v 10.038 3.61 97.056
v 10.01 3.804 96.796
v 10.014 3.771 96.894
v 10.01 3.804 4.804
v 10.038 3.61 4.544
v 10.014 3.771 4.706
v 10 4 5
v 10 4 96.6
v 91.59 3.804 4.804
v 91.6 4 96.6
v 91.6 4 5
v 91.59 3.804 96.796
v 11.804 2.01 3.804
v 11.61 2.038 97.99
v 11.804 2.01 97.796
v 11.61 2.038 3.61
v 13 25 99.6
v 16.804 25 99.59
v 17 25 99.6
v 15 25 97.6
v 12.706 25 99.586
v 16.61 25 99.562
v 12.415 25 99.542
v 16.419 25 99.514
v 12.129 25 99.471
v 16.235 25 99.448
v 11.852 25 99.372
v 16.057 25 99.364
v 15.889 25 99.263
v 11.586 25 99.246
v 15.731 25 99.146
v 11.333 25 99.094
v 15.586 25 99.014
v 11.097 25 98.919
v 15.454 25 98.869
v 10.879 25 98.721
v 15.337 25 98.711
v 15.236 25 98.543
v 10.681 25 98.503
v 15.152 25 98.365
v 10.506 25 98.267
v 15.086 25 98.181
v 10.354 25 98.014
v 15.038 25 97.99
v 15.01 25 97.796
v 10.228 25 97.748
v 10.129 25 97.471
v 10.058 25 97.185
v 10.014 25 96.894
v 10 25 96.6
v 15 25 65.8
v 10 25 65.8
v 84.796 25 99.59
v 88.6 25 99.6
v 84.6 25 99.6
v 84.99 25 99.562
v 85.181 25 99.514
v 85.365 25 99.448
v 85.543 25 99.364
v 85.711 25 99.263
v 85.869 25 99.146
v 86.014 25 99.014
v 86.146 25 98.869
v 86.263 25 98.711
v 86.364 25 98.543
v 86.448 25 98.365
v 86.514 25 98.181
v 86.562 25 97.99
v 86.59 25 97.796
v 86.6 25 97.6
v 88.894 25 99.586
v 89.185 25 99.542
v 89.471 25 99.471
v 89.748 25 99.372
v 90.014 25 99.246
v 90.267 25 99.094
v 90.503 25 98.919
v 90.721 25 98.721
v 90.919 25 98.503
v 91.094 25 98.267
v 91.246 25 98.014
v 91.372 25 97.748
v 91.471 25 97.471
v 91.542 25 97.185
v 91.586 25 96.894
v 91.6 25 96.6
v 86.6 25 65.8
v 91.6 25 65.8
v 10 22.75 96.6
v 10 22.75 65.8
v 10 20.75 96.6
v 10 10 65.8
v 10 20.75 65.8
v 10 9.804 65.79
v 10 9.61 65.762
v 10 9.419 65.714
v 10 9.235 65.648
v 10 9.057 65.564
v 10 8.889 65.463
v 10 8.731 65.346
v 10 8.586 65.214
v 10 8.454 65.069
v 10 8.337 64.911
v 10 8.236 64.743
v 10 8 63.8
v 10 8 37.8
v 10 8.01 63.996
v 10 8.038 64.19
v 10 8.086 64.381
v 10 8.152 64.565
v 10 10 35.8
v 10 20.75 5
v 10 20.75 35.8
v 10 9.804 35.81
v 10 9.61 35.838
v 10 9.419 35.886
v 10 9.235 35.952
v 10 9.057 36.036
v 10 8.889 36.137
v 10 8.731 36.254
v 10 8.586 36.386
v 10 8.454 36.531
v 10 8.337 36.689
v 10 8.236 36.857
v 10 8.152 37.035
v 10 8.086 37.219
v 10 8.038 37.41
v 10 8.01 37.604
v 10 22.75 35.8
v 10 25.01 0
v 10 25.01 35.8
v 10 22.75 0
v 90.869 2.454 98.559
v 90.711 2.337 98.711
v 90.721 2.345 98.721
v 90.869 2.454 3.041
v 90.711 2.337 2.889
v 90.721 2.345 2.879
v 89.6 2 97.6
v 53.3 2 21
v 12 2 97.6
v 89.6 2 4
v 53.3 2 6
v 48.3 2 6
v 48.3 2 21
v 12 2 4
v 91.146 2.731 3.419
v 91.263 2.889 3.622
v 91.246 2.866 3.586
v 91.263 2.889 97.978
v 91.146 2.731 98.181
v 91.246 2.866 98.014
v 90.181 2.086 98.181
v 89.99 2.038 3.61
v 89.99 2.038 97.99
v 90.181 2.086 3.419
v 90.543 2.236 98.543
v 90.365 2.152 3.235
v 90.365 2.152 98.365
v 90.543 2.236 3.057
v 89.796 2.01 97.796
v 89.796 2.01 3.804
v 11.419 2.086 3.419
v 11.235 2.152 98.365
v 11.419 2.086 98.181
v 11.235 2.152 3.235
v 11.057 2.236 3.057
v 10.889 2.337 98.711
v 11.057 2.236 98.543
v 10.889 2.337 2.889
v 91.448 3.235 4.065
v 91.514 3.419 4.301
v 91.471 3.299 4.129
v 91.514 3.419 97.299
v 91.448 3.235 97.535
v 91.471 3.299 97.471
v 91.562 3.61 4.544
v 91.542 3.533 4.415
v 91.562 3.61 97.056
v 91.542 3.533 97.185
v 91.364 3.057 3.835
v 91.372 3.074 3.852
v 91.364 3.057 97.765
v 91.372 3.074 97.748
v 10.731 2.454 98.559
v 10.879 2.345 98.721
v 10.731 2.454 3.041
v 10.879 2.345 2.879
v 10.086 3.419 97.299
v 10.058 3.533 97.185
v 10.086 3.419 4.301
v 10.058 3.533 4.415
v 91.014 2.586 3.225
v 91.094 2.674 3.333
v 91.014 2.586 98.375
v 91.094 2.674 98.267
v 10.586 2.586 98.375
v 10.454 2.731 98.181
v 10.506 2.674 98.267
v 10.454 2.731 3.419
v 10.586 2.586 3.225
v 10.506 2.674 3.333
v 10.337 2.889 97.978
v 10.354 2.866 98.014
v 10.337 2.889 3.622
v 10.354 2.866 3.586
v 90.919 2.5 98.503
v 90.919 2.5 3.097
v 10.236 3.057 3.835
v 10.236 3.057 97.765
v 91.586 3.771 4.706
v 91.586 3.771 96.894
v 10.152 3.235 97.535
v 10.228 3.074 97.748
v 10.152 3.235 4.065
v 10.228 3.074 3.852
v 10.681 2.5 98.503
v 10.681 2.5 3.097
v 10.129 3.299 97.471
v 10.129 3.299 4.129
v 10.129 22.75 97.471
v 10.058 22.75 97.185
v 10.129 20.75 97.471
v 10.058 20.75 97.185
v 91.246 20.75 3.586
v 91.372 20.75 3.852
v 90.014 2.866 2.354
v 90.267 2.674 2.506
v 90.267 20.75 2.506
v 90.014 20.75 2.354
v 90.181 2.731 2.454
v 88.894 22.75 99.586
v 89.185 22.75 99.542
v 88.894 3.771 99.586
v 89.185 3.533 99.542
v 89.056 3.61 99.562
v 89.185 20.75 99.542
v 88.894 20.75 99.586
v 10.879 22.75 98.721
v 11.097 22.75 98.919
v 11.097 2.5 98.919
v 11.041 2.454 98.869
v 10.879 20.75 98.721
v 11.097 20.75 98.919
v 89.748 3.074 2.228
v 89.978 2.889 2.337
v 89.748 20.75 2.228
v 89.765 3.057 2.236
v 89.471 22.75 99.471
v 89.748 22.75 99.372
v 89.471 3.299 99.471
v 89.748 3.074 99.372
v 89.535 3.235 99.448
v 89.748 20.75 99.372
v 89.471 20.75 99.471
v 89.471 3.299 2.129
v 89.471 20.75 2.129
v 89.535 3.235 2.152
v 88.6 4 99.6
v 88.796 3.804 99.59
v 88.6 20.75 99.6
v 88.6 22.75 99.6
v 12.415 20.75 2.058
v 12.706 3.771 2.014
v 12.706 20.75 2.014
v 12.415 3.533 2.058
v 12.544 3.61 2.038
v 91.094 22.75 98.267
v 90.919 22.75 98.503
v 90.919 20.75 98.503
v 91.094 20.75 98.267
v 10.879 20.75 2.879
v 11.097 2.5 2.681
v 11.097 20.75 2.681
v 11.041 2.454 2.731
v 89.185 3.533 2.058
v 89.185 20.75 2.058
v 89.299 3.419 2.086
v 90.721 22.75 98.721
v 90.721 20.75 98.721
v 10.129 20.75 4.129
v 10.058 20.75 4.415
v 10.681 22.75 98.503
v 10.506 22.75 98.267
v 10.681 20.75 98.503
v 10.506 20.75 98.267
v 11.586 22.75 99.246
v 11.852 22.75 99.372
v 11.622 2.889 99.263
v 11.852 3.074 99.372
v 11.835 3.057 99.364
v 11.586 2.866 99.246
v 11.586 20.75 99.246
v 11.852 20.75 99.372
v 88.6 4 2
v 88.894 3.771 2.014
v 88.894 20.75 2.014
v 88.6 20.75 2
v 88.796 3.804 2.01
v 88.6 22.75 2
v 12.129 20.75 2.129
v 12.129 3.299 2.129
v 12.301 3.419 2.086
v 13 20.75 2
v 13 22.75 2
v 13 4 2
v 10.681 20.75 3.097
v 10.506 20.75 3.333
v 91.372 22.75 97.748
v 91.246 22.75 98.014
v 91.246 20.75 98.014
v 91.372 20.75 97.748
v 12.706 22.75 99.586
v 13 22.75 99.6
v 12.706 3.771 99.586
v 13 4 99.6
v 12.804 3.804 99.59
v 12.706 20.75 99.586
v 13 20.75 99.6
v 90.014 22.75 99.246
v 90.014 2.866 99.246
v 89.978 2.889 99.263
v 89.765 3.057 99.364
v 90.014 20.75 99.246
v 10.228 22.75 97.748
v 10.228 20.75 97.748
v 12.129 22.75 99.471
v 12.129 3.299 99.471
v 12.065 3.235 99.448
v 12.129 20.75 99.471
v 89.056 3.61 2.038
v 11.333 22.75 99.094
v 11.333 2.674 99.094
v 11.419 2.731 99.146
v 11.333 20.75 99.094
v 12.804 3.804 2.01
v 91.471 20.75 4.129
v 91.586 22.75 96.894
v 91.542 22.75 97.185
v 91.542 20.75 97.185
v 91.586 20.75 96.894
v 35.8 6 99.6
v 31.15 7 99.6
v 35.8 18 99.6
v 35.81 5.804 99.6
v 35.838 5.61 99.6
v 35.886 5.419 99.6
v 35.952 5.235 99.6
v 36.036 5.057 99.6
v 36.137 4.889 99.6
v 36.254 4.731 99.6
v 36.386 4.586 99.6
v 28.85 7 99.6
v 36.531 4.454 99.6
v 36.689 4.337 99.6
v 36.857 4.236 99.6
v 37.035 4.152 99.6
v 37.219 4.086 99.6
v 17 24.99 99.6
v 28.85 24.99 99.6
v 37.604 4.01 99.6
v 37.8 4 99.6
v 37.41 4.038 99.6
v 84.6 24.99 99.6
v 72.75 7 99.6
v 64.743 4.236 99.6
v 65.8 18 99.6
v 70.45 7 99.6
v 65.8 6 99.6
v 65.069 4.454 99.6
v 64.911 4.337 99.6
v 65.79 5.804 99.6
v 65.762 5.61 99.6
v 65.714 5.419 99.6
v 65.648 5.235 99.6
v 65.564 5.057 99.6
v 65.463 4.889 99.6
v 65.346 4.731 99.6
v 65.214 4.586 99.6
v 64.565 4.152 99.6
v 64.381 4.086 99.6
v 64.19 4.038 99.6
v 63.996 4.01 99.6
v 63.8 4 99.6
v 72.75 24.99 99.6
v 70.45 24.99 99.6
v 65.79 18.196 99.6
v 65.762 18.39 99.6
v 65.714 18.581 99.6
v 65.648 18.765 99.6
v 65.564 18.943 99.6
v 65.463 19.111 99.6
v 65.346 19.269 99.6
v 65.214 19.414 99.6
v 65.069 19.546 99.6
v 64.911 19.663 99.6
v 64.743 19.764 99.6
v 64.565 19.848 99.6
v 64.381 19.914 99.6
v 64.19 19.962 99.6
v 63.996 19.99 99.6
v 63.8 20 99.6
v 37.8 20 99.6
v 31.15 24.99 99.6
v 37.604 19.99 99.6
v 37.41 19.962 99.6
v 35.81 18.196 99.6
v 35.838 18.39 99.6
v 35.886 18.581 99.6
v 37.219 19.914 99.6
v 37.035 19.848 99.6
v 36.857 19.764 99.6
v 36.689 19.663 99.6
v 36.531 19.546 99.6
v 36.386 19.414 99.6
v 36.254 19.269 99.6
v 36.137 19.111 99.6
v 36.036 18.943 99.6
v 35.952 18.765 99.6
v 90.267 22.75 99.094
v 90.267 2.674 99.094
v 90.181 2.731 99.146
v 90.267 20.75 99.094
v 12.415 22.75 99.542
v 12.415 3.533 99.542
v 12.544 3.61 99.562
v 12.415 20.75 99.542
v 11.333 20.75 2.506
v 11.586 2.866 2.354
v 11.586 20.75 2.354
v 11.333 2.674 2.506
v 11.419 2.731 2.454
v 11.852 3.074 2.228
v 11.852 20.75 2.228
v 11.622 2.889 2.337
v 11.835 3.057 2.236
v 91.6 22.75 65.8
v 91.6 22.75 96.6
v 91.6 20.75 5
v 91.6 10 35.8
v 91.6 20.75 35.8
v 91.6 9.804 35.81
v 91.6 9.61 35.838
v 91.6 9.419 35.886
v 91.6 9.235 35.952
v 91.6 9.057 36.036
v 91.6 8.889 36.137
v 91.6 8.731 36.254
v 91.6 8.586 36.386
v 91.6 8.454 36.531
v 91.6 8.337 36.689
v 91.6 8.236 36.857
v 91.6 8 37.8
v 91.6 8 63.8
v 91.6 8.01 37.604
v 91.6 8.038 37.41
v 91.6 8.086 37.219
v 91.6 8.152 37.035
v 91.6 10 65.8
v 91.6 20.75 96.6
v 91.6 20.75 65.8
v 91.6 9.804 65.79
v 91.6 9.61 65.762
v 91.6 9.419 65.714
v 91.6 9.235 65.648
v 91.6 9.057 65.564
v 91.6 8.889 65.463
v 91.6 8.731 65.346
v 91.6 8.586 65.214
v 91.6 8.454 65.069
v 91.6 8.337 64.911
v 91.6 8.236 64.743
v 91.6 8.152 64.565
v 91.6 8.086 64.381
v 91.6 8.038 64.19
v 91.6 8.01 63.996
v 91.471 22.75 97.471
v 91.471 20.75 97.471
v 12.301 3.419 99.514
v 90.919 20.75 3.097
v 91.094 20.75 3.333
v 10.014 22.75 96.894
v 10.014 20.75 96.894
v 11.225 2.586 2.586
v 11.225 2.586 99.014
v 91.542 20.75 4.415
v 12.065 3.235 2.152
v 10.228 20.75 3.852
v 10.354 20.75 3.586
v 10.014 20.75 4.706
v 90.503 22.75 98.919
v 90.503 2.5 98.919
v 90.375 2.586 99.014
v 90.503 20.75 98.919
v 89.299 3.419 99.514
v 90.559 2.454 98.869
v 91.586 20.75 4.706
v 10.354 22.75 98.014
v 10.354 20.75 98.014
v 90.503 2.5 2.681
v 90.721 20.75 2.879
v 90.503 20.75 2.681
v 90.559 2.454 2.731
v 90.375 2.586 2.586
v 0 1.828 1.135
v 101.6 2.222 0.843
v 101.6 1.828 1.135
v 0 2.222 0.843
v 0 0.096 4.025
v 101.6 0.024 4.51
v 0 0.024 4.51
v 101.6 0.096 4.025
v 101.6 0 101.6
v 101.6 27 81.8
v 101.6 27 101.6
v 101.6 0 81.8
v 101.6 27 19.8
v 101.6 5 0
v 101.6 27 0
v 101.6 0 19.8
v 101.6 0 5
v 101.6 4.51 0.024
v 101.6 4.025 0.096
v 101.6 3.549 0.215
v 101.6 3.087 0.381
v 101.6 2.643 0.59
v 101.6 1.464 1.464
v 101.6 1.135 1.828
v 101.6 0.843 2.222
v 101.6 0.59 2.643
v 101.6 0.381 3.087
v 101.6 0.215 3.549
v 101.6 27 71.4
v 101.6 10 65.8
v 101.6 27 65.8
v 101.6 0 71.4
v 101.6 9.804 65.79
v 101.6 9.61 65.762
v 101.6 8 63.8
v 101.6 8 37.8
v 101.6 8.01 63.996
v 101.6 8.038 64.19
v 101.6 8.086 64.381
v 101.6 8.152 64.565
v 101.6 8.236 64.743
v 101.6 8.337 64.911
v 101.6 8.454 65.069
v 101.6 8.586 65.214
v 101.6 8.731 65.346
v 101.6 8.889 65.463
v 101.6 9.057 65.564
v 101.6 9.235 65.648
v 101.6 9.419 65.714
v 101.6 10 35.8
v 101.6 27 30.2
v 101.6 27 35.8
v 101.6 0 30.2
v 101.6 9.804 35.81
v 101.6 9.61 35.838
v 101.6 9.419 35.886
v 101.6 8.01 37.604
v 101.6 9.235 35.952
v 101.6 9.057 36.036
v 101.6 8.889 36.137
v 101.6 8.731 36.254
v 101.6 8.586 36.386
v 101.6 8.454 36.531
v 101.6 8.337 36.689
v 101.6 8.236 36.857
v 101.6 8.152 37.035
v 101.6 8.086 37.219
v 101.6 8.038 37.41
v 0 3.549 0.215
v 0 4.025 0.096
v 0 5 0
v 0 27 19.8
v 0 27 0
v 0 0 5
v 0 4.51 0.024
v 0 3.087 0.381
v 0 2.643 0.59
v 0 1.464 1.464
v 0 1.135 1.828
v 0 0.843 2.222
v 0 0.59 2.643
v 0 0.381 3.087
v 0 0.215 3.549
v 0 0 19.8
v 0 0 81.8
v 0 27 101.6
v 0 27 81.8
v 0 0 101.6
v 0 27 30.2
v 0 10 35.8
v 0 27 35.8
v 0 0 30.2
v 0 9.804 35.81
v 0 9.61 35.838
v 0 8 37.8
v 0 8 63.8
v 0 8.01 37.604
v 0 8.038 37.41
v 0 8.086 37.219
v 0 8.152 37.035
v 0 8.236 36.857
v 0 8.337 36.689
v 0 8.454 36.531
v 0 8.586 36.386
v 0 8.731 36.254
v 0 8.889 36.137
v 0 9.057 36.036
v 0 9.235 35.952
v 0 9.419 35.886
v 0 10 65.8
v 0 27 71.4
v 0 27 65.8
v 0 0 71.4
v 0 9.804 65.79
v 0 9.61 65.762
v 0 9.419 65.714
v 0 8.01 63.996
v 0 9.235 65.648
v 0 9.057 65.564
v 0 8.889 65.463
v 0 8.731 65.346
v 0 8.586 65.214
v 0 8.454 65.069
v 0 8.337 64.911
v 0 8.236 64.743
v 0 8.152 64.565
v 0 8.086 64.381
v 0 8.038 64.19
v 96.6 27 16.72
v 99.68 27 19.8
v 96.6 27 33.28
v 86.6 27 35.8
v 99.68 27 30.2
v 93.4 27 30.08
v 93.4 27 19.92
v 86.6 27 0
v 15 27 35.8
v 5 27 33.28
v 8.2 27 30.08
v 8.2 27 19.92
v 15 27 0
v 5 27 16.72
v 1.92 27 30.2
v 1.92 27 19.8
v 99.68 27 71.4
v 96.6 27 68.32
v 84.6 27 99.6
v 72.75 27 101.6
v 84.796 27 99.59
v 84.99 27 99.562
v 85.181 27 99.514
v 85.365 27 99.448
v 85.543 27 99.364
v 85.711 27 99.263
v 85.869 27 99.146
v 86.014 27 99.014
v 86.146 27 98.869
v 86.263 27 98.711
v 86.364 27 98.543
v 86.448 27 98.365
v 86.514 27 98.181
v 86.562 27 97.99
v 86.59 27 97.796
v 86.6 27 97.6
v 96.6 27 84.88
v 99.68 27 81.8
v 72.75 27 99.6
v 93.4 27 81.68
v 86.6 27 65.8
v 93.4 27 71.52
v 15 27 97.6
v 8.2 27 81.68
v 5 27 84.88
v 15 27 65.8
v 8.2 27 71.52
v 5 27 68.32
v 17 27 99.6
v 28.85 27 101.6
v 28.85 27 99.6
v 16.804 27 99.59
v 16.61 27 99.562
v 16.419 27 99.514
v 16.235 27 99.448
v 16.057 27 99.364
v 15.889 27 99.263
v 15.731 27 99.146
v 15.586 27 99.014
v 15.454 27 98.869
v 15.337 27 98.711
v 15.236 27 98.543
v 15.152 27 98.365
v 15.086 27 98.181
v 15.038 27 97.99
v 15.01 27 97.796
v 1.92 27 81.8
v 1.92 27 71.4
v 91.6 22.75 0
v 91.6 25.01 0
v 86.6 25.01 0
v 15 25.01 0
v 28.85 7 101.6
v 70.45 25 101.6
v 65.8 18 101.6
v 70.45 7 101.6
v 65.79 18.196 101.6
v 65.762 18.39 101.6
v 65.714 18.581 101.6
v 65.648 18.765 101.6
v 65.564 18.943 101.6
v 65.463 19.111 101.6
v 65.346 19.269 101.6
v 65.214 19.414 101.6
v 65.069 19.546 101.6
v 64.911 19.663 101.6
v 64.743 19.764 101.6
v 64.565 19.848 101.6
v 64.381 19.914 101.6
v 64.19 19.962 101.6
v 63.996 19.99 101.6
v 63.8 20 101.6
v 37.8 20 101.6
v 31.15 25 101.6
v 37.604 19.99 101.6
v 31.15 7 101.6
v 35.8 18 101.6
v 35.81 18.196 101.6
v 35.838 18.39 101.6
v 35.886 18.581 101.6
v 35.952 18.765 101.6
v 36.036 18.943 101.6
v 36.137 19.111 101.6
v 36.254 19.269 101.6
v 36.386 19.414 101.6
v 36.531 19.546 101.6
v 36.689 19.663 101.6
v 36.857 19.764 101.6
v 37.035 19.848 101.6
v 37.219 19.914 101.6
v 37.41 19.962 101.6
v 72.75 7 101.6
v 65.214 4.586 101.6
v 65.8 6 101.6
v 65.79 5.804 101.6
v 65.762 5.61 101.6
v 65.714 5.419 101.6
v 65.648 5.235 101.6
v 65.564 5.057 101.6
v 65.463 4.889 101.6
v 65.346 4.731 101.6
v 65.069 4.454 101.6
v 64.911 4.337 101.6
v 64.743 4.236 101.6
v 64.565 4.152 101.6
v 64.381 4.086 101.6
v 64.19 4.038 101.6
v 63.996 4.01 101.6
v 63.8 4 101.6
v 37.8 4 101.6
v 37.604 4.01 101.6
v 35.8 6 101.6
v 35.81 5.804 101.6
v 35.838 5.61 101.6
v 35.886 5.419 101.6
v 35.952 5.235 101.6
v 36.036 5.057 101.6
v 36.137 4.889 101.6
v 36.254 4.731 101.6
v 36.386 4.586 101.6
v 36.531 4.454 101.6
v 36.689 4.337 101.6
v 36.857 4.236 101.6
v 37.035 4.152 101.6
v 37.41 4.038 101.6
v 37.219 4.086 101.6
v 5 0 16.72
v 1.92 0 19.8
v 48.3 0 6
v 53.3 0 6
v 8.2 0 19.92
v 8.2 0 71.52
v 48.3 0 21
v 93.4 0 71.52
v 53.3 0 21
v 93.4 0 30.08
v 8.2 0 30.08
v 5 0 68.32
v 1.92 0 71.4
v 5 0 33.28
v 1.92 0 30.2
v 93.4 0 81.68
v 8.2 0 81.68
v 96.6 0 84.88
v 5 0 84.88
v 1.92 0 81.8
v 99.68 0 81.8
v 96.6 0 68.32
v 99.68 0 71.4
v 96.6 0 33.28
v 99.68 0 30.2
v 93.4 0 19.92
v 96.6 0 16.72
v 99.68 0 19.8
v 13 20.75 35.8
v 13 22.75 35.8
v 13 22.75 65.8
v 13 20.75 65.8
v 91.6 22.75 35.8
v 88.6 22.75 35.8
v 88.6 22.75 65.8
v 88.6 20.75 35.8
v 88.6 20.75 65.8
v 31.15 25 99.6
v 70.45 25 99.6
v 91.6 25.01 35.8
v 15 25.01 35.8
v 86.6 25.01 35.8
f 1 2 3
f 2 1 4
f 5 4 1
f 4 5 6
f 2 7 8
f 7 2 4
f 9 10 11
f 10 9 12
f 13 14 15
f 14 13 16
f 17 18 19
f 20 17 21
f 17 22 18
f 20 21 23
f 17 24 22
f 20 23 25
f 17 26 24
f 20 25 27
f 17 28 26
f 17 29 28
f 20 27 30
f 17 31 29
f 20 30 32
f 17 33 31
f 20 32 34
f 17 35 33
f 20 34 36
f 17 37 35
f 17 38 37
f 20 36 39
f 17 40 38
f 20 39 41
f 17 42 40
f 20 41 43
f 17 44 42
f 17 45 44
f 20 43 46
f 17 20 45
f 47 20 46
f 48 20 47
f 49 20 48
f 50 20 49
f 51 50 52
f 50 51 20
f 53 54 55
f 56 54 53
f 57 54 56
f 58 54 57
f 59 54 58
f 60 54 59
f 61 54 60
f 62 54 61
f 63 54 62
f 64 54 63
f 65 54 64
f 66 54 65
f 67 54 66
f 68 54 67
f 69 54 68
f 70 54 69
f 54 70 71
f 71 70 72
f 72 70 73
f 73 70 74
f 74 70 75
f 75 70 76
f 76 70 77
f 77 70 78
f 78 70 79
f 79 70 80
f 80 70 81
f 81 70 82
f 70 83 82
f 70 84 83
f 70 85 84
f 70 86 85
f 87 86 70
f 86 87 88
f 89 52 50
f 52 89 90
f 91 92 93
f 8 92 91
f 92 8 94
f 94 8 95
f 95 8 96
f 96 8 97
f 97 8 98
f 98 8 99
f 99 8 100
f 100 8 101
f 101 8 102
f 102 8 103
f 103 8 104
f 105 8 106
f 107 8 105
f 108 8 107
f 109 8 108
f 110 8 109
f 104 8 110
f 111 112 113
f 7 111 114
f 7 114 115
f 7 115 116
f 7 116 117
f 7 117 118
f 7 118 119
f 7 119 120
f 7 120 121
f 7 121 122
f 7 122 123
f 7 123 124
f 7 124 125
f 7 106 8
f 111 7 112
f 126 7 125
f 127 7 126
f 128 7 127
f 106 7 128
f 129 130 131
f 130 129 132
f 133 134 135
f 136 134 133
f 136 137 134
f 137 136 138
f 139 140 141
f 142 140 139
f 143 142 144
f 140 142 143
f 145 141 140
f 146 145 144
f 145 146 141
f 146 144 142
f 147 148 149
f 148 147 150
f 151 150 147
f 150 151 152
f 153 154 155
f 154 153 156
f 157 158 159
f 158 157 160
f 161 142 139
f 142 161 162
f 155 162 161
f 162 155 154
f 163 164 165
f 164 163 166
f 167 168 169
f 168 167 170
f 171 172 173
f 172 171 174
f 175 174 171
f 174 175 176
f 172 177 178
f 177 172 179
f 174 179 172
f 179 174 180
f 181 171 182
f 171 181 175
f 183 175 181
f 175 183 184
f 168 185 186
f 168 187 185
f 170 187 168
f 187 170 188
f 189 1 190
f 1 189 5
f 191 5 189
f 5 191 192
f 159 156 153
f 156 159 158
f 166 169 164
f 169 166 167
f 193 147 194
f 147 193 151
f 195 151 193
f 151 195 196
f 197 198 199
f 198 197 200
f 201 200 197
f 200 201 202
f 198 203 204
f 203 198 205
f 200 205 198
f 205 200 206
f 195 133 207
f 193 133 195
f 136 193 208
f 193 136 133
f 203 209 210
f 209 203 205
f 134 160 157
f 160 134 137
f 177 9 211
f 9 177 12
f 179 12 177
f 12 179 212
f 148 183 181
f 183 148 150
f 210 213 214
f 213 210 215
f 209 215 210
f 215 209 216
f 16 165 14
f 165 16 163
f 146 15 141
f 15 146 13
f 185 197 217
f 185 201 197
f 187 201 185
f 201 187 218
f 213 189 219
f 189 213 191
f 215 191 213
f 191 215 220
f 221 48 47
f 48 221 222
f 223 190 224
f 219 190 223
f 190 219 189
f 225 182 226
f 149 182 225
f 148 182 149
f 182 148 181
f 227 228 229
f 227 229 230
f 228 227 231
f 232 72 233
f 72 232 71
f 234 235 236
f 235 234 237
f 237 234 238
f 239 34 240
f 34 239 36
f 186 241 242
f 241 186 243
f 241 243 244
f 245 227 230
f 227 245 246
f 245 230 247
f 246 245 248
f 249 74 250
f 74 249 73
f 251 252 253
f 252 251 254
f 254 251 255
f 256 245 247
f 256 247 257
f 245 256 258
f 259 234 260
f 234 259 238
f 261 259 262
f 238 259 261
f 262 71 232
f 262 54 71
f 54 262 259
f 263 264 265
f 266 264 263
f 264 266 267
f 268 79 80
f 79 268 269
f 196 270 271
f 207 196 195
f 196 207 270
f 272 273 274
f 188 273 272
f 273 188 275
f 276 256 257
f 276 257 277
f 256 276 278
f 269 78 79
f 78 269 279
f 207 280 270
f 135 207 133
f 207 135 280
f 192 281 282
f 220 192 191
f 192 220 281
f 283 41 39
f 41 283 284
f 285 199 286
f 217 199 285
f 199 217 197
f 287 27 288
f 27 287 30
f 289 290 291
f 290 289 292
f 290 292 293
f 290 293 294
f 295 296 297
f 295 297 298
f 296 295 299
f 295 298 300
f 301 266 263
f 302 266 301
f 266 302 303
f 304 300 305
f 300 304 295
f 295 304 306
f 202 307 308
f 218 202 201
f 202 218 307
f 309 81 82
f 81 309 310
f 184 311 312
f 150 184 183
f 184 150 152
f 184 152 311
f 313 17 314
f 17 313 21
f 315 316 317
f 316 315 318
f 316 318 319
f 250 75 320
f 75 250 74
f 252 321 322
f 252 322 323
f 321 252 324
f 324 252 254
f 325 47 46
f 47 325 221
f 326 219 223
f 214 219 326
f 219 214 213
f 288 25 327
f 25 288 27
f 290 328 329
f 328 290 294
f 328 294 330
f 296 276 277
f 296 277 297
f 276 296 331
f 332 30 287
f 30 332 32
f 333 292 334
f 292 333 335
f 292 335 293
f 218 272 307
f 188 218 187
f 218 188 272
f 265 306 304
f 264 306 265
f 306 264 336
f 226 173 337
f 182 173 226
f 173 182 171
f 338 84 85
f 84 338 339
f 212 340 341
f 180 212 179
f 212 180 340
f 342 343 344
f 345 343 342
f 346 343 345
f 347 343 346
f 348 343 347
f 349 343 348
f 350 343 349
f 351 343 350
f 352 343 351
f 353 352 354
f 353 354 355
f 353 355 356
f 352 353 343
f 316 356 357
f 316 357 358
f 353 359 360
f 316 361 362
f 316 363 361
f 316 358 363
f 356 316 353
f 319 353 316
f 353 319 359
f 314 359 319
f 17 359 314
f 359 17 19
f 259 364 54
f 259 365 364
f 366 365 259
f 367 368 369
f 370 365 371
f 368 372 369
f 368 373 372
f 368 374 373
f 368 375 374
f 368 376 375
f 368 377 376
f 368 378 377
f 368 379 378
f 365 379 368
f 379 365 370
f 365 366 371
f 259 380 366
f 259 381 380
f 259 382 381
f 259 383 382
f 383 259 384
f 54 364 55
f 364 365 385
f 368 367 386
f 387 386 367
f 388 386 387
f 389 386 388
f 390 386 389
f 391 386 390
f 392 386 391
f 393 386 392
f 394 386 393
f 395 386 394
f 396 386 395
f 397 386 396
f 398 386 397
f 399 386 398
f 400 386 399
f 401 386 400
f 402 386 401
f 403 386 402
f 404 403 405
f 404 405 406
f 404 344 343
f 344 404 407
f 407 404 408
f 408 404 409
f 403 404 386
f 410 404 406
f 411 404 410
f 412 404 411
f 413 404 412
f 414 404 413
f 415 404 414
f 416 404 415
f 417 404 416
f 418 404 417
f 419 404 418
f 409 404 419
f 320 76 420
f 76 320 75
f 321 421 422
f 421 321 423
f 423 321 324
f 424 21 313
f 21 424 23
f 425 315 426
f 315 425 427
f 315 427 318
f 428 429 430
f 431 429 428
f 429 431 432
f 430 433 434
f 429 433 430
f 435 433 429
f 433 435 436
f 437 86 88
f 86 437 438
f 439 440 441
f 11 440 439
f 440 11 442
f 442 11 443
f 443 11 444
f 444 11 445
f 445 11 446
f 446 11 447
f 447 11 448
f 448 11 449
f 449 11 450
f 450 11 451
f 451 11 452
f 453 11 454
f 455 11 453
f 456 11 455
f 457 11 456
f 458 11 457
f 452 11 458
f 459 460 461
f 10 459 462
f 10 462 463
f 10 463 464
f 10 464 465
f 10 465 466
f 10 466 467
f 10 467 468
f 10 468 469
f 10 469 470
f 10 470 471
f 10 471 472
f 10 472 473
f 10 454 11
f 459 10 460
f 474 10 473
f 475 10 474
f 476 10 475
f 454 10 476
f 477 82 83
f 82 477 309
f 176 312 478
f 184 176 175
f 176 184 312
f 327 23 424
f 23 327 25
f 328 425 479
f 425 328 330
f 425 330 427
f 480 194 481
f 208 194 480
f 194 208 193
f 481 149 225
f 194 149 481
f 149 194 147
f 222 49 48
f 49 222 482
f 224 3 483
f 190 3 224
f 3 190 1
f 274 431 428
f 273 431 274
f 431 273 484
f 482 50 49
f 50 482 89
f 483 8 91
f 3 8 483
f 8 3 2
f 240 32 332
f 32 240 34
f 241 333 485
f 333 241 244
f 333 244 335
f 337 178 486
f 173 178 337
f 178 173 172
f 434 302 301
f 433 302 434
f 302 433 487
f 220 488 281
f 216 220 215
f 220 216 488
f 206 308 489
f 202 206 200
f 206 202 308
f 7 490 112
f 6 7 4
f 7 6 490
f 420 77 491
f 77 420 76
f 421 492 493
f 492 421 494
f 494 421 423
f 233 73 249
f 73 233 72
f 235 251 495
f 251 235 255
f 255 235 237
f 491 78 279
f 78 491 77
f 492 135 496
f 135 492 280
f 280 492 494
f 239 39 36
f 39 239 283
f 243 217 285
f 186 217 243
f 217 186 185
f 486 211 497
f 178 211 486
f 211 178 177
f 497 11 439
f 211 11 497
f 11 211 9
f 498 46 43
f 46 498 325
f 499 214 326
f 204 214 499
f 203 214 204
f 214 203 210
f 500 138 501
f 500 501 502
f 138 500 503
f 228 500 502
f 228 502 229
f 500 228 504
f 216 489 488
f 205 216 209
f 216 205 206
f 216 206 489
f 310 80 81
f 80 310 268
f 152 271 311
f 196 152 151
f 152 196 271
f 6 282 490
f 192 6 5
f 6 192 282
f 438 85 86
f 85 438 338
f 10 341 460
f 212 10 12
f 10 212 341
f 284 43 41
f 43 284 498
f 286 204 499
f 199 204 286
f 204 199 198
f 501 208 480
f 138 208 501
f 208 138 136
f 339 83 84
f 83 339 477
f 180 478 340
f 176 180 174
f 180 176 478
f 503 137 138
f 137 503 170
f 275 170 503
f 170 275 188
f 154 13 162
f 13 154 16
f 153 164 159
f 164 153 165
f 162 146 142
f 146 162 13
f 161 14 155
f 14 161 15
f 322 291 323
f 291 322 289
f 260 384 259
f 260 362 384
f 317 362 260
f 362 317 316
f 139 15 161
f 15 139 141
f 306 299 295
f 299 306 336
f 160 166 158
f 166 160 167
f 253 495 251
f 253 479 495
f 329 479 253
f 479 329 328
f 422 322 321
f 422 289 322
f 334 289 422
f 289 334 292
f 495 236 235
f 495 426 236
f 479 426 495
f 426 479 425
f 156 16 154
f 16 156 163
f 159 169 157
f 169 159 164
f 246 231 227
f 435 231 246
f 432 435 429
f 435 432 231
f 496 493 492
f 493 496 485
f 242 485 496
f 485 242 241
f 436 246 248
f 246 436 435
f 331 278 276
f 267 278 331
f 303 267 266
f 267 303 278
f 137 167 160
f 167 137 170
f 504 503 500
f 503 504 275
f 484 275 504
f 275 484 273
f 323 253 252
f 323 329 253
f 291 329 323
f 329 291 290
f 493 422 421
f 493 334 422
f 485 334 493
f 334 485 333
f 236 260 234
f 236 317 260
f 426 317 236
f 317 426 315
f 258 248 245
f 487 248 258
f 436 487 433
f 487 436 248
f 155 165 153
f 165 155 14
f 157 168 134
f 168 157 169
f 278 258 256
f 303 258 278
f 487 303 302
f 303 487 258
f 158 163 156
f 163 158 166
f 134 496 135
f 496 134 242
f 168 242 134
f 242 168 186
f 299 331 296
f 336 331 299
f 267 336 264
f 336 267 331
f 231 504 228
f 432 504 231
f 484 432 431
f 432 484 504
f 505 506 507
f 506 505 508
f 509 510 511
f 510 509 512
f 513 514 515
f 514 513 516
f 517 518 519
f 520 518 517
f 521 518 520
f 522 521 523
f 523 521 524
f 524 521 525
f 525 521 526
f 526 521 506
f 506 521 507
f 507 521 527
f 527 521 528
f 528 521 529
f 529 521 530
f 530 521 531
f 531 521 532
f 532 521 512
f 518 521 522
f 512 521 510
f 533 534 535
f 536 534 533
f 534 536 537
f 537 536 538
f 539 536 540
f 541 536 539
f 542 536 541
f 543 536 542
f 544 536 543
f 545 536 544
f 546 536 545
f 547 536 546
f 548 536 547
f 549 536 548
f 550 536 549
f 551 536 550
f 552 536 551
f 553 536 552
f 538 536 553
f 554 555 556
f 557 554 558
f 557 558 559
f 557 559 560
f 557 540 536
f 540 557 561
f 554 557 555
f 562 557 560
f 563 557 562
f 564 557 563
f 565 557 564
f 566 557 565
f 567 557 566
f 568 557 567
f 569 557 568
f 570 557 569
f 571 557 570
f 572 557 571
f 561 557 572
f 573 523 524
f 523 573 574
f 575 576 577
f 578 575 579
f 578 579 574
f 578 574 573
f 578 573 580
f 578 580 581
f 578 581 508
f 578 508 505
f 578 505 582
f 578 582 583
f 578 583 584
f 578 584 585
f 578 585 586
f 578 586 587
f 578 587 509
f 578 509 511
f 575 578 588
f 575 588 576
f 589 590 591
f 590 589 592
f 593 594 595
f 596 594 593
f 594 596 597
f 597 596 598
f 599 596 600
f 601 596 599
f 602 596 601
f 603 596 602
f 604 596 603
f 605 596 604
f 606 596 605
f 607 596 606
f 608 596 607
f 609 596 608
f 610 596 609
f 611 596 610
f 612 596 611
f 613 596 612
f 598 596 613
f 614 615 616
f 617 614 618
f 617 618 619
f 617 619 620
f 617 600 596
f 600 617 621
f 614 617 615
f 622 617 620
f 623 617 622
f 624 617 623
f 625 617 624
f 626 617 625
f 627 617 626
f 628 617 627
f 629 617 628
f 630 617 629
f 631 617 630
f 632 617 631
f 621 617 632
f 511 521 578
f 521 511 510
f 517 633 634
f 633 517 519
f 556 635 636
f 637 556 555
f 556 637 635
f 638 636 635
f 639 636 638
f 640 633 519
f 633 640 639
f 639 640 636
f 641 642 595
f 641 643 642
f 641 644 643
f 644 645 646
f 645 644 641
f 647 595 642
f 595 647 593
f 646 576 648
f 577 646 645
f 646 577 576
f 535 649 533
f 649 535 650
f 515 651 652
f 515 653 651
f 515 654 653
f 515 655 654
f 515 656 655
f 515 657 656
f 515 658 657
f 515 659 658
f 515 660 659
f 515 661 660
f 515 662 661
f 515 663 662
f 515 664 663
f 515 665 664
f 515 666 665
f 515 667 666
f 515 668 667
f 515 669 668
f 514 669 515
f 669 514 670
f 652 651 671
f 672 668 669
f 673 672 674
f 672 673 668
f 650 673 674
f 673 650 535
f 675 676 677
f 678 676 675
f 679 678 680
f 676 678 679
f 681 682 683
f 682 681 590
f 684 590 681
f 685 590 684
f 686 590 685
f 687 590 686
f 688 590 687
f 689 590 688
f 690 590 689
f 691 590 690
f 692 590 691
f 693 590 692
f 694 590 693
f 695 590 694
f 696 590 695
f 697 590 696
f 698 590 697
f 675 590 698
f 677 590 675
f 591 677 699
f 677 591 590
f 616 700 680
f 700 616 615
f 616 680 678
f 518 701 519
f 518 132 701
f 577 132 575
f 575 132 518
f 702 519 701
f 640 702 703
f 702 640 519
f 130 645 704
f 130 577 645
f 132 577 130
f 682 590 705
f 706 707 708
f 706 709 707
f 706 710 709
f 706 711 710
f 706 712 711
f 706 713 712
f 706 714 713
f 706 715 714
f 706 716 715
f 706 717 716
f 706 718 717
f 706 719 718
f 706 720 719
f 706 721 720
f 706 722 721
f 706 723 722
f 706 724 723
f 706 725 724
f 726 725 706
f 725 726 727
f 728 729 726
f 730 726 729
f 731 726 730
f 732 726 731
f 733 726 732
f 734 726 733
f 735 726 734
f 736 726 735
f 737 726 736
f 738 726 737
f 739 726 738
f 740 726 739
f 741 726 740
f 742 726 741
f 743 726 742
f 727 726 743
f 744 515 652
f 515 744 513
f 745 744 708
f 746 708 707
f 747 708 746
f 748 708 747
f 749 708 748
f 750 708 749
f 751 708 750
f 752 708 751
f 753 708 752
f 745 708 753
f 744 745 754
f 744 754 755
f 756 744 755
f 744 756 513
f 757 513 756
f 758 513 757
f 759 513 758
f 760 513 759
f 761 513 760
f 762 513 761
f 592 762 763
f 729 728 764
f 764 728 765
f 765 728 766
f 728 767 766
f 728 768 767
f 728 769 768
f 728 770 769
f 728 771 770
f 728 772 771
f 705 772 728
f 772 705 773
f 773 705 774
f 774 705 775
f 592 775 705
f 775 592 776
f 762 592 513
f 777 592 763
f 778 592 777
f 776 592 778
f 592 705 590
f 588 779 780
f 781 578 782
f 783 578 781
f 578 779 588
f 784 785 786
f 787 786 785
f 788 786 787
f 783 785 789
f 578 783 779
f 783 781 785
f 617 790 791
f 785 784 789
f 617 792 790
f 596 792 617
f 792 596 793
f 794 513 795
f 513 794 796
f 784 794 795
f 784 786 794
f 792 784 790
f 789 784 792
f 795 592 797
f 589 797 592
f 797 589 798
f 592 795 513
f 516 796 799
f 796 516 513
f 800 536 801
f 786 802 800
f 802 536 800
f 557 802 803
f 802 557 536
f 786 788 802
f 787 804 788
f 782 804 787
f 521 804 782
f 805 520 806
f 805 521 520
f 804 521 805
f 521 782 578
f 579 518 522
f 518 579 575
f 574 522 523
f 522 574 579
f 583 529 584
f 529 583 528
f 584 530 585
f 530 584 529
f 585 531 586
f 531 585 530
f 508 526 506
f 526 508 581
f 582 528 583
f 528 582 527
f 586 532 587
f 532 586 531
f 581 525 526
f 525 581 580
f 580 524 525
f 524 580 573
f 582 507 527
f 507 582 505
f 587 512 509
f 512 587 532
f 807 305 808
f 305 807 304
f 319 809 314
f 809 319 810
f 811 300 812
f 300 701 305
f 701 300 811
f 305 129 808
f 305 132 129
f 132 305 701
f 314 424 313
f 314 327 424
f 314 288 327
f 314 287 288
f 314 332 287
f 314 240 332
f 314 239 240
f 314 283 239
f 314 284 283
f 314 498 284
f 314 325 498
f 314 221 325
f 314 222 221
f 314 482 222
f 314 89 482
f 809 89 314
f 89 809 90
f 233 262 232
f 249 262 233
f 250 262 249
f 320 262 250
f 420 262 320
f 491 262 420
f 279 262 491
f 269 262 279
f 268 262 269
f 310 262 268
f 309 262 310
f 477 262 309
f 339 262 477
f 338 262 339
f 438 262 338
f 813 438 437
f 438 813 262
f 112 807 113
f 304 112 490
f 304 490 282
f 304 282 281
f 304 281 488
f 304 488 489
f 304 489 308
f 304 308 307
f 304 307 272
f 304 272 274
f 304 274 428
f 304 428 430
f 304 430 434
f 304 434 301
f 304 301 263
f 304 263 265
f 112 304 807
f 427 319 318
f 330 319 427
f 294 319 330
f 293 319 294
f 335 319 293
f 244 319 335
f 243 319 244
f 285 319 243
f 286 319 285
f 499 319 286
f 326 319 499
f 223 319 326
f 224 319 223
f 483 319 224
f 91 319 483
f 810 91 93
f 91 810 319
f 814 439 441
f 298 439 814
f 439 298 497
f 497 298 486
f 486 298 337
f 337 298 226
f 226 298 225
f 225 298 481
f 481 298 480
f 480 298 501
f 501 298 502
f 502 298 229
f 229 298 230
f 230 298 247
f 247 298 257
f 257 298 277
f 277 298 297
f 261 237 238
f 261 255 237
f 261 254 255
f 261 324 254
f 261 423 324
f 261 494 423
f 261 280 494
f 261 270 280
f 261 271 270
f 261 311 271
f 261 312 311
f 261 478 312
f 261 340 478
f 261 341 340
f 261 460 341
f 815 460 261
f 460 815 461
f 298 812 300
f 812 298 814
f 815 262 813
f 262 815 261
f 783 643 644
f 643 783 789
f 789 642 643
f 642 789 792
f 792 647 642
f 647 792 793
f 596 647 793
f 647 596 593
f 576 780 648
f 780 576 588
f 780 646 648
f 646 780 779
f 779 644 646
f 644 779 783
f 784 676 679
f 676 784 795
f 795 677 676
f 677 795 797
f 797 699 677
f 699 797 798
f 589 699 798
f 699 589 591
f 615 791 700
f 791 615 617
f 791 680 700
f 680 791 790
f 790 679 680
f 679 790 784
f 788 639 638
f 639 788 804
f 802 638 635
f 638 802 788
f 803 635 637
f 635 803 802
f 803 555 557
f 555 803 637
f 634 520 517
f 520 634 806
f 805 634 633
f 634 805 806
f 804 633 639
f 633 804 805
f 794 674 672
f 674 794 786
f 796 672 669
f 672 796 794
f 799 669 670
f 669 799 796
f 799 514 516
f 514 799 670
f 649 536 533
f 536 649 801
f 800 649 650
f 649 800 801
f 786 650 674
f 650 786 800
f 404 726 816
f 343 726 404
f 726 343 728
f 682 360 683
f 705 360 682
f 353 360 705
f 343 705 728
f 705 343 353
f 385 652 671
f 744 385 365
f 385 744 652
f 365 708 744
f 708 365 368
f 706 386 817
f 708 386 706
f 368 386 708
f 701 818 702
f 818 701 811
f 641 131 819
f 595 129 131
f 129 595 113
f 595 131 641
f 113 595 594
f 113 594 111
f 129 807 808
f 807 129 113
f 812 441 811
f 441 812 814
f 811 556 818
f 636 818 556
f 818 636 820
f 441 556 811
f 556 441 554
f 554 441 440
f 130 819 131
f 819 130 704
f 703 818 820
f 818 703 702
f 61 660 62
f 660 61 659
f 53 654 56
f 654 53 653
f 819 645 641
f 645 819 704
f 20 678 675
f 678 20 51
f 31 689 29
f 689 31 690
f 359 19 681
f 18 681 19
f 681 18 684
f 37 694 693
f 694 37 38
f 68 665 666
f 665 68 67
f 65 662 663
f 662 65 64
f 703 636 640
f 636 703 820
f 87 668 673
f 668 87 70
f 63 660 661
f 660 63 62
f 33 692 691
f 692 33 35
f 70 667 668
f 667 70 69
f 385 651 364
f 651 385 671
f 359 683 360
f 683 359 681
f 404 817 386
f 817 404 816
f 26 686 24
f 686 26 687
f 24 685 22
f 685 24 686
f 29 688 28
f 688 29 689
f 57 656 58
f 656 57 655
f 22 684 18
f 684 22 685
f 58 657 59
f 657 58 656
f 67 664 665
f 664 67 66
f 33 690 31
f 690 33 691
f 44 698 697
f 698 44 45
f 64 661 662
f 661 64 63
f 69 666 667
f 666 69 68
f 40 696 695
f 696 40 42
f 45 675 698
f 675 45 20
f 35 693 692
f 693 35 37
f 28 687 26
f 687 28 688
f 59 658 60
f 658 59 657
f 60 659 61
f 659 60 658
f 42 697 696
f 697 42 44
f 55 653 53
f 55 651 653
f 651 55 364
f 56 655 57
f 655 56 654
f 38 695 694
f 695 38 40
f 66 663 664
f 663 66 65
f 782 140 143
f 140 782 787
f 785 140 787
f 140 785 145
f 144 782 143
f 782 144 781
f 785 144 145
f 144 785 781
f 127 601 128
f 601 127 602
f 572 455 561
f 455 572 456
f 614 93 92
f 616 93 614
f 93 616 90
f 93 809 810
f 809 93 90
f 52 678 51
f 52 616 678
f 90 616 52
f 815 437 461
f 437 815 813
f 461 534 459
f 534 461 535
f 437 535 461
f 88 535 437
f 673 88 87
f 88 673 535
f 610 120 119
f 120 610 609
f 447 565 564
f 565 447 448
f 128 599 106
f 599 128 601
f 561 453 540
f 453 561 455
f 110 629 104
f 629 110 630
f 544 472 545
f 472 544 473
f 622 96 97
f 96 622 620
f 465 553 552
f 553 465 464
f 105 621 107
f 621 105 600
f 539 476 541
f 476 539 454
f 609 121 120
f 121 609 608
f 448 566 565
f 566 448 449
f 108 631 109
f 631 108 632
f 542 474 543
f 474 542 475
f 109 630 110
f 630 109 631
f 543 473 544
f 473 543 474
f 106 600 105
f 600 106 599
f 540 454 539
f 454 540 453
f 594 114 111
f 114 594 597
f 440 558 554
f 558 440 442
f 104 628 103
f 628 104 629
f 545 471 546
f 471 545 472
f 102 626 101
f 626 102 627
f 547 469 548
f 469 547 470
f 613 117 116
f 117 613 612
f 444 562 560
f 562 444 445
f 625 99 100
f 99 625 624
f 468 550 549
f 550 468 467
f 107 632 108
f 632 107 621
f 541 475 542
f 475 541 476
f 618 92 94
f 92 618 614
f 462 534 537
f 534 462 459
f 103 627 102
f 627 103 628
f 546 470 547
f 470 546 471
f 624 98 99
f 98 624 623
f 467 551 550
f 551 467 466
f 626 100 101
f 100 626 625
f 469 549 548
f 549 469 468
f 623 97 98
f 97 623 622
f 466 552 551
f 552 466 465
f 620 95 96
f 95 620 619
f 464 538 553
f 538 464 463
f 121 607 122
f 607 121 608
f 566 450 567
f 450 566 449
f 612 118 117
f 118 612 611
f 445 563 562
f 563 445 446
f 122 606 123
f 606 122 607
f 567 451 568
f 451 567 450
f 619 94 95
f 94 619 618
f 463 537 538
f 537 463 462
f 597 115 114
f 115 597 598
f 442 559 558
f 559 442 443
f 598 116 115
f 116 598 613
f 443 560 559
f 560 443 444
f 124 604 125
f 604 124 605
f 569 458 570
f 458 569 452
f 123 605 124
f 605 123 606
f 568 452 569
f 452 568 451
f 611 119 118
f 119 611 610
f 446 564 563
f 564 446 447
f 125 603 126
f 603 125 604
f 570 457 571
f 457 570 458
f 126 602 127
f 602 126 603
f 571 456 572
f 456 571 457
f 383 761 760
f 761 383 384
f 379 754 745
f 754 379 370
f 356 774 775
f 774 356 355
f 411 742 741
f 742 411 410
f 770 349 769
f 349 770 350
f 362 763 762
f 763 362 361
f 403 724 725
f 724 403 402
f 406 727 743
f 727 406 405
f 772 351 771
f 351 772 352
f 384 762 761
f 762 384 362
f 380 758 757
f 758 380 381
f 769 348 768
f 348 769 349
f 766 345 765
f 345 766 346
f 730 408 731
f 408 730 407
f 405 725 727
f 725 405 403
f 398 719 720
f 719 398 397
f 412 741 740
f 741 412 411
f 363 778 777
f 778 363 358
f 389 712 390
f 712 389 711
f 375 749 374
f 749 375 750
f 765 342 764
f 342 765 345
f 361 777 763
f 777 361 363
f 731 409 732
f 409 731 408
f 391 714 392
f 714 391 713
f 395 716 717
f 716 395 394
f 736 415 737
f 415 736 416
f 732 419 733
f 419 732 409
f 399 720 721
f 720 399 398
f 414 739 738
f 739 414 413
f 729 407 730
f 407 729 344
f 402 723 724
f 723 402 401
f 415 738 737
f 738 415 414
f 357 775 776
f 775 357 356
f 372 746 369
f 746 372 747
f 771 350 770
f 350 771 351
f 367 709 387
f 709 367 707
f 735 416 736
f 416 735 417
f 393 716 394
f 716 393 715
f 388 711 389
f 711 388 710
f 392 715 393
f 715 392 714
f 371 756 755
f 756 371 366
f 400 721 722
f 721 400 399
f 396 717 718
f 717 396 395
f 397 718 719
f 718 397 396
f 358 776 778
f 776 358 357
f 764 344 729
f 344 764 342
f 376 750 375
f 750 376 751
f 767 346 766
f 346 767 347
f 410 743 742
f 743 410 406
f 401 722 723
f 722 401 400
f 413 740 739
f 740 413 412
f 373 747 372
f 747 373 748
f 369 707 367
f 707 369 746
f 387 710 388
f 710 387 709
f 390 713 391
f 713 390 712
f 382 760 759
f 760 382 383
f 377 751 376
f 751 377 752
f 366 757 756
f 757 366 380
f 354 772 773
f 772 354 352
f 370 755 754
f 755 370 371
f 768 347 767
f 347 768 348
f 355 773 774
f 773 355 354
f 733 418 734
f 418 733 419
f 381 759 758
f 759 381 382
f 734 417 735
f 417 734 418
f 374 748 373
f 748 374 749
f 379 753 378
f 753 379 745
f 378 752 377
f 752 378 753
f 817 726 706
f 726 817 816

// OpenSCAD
// Center body (SolidWorks part 002). Middle module of the coffee-pot timer:
// holds one IR proximity sensor behind a window in the front face, passes
// wires up into the display box through the top, joins a side box at each
// end with dovetail-like notches, and takes a back door that slides up from
// the bottom into grooves at the back.
// Frame: X = width (left->right seen from the front), Y = depth (0 = front
// face toward the pots, 27 = back/wall side), Z = height.

// --- Overall block ---
center_w = 101.6;              // width (X)
center_d = 27.0;               // depth (Y)
center_h = 101.6;              // height (Z)
center_front_edge_r = 5.0;     // outer fillet along the front-bottom edge

// --- Inner cavity (open at the back) ---
center_side_wall = 10.0;       // solid side walls (X 0..10 and 91.6..101.6)
center_front_wall = 2.0;       // front wall thickness
center_floor = 2.0;            // floor thickness
center_roof = 2.0;             // top plate thickness
center_cavity_back = 25.0;     // cavity reaches Y=25 (back lip behind it)
center_cavity_corner_r = 2.0;  // vertical front corners of the cavity
center_cavity_side_r = 3.0;    // fillet floor/roof <-> side walls
center_cavity_front_r = 2.0;   // fillet floor/roof <-> front wall

// --- Back door: grooves + retaining lip (door slides up from the bottom) ---
center_rib_y = 20.75;          // front face of the ribs in front of the door
center_rib_t = 2.0;            // rib thickness (Y)
center_rib_w = 3.0;            // rib width out from each side wall (X)
center_door_slot_y = 22.75;    // door slot Y 22.75..25 (2.25 thick)
center_door_slot_top = 35.8;   // slot cut straight up from the bottom to here (side window above)
center_lip_t = 2.0;            // back lip thickness (Y 25..27)
center_lip_w = 5.0;            // back lip width over each side wall edge (opening X 15..86.6)
center_lip_open_r = 2.0;       // top corners of the back opening

// --- IR sensor window in the front face ---
center_sensor_w = 5.0;         // X width, centered
center_sensor_z0 = 6.0;        // bottom
center_sensor_z1 = 21.0;       // top

// --- Side windows (wires to the side boxes), cut through the full width ---
center_side_win_y = 8.0;       // starts behind the front, open to the back
center_side_win_z0 = 35.8;
center_side_win_z1 = 65.8;
center_side_win_r = 2.0;       // front corners

// --- Joint notches (dovetail-like), same profile at both ends, full depth ---
center_notch_zc = [25.0, 76.6];  // notch centers
center_notch_mouth = 10.4;     // opening height at the end face
center_notch_neck_x = 1.92;    // mouth stays straight this far in
center_notch_mid_x = 5.0;      // widest point of the undercut
center_notch_mid_h = 16.56;    // height at the widest point
center_notch_depth = 8.2;      // depth into the side wall
center_notch_back_h = 10.16;   // height of the flat back face

// --- Top: display-box interface ---
center_wire_hole = [30.0, 16.0]; // wire pass-through X x Y, centered in X
center_wire_hole_y = 4.0;        // front edge of the wire hole
center_wire_hole_r = 2.0;        // corner radius
center_top_groove_w = 2.3;       // two grooves through the top plate
center_top_groove_xc = 30.0;     // left groove center (right one mirrored)
center_top_groove_y = 7.0;       // grooves run from here to the back
center_top_recess_d = 2.0;       // top plate removed at the back between the grooves (Y 25..27)

e = 0.01;

module center_rounded_rect(x0, y0, x1, y1, r) {
  // 2D rectangle with all corners rounded
  translate([x0 + r, y0 + r]) offset(r = r) square([x1 - x0 - 2 * r, y1 - y0 - 2 * r]);
}

// One notch profile in (X,Z) at the left end, extruded through the full depth
module center_notch(zc) {
  m = center_notch_mouth / 2;
  w = center_notch_mid_h / 2;
  b = center_notch_back_h / 2;
  translate([0, center_d + 1, 0]) rotate([90, 0, 0])
    linear_extrude(center_d + 2)
      polygon([[-1, zc - m], [center_notch_neck_x, zc - m], [center_notch_mid_x, zc - w],
               [center_notch_depth, zc - b], [center_notch_depth, zc + b],
               [center_notch_mid_x, zc + w], [center_notch_neck_x, zc + m], [-1, zc + m]]);
}

module center_cavity() {
  x0 = center_side_wall; x1 = center_w - center_side_wall;
  y0 = center_front_wall; y1 = center_cavity_back;
  z0 = center_floor; z1 = center_h - center_roof;
  intersection() {
    // plan view: rounded front corners
    linear_extrude(center_h)
      hull() {
        center_rounded_rect(x0, y0, x1, y0 + 2 * center_cavity_corner_r + 1, center_cavity_corner_r);
        translate([x0, y1 - 1]) square([x1 - x0, 1]);
      }
    // front view: side fillets R3 at floor and roof
    translate([0, y1, 0]) rotate([90, 0, 0]) linear_extrude(y1)
      center_rounded_rect(x0, z0, x1, z1, center_cavity_side_r);
    // side view: front fillets R2 at floor and roof
    rotate([90, 0, 90]) linear_extrude(center_w)
      hull() {
        center_rounded_rect(y0, z0, y0 + 2 * center_cavity_front_r + 1, z1, center_cavity_front_r);
        translate([y1 - 1, z0]) square([1, z1 - z0]);
      }
  }
}

module center_body() {
  $fn = 64;
  difference() {
    union() {
      difference() {
        // shell with rounded front-bottom edge
        rotate([90, 0, 90]) linear_extrude(center_w)
          hull() {
            translate([center_front_edge_r, center_front_edge_r]) circle(r = center_front_edge_r);
            translate([0, center_front_edge_r]) square([center_d, center_h - center_front_edge_r]);
            translate([center_front_edge_r, 0]) square([center_d - center_front_edge_r, center_h]);
          }
        center_cavity();
      }
      // ribs in front of the door (one per side)
      for (mx = [0, 1]) translate([mx * center_w, 0, 0]) mirror([mx, 0, 0])
        translate([center_side_wall, center_rib_y, 0]) cube([center_rib_w, center_rib_t, center_h]);
    }

    // door slot: through the floor and straight up to the side windows
    translate([center_side_wall, center_door_slot_y, -1])
      cube([center_w - 2 * center_side_wall, center_cavity_back - center_door_slot_y + e, center_door_slot_top + 1]);

    // back opening between the retaining lips, rounded top corners
    lx0 = center_side_wall + center_lip_w; lx1 = center_w - center_side_wall - center_lip_w;
    translate([0, center_d + 1, 0]) rotate([90, 0, 0]) linear_extrude(center_lip_t + 1 + e)
      hull() {
        translate([lx0, -1]) square([lx1 - lx0, 1]);
        translate([lx0 + center_lip_open_r, center_h - center_roof - center_lip_open_r]) circle(r = center_lip_open_r);
        translate([lx1 - center_lip_open_r, center_h - center_roof - center_lip_open_r]) circle(r = center_lip_open_r);
      }

    // IR sensor window in the front wall
    translate([(center_w - center_sensor_w) / 2, -1, center_sensor_z0])
      cube([center_sensor_w, center_front_wall + 2, center_sensor_z1 - center_sensor_z0]);

    // side windows, through the full width, open to the back
    rotate([90, 0, 90]) translate([0, 0, -1]) linear_extrude(center_w + 2)
      hull() {
        translate([center_side_win_y + center_side_win_r, center_side_win_z0 + center_side_win_r]) circle(r = center_side_win_r);
        translate([center_side_win_y + center_side_win_r, center_side_win_z1 - center_side_win_r]) circle(r = center_side_win_r);
        translate([center_d - 1, center_side_win_z0]) square([2, center_side_win_z1 - center_side_win_z0]);
      }

    // joint notches, left end modeled, right end mirrored
    for (mx = [0, 1]) translate([mx * center_w, 0, 0]) mirror([mx, 0, 0])
      for (zc = center_notch_zc) center_notch(zc);

    // wire pass-through into the display box
    translate([0, 0, center_h - center_roof - 1]) linear_extrude(center_roof + 2)
      center_rounded_rect((center_w - center_wire_hole[0]) / 2, center_wire_hole_y,
                          (center_w + center_wire_hole[0]) / 2, center_wire_hole_y + center_wire_hole[1],
                          center_wire_hole_r);

    // display-box grooves through the top plate (mirrored pair)
    for (mx = [0, 1]) translate([mx * center_w, 0, 0]) mirror([mx, 0, 0])
      translate([center_top_groove_xc - center_top_groove_w / 2, center_top_groove_y, center_h - center_roof - 1])
        cube([center_top_groove_w, center_d - center_top_groove_y + 1, center_roof + 2]);

    // top plate removed at the back between the grooves
    translate([center_top_groove_xc - center_top_groove_w / 2, center_d - center_top_recess_d, center_h - center_roof - 1])
      cube([center_w - 2 * center_top_groove_xc + center_top_groove_w, center_top_recess_d + 1, center_roof + 2]);
  }
}

center_body();
